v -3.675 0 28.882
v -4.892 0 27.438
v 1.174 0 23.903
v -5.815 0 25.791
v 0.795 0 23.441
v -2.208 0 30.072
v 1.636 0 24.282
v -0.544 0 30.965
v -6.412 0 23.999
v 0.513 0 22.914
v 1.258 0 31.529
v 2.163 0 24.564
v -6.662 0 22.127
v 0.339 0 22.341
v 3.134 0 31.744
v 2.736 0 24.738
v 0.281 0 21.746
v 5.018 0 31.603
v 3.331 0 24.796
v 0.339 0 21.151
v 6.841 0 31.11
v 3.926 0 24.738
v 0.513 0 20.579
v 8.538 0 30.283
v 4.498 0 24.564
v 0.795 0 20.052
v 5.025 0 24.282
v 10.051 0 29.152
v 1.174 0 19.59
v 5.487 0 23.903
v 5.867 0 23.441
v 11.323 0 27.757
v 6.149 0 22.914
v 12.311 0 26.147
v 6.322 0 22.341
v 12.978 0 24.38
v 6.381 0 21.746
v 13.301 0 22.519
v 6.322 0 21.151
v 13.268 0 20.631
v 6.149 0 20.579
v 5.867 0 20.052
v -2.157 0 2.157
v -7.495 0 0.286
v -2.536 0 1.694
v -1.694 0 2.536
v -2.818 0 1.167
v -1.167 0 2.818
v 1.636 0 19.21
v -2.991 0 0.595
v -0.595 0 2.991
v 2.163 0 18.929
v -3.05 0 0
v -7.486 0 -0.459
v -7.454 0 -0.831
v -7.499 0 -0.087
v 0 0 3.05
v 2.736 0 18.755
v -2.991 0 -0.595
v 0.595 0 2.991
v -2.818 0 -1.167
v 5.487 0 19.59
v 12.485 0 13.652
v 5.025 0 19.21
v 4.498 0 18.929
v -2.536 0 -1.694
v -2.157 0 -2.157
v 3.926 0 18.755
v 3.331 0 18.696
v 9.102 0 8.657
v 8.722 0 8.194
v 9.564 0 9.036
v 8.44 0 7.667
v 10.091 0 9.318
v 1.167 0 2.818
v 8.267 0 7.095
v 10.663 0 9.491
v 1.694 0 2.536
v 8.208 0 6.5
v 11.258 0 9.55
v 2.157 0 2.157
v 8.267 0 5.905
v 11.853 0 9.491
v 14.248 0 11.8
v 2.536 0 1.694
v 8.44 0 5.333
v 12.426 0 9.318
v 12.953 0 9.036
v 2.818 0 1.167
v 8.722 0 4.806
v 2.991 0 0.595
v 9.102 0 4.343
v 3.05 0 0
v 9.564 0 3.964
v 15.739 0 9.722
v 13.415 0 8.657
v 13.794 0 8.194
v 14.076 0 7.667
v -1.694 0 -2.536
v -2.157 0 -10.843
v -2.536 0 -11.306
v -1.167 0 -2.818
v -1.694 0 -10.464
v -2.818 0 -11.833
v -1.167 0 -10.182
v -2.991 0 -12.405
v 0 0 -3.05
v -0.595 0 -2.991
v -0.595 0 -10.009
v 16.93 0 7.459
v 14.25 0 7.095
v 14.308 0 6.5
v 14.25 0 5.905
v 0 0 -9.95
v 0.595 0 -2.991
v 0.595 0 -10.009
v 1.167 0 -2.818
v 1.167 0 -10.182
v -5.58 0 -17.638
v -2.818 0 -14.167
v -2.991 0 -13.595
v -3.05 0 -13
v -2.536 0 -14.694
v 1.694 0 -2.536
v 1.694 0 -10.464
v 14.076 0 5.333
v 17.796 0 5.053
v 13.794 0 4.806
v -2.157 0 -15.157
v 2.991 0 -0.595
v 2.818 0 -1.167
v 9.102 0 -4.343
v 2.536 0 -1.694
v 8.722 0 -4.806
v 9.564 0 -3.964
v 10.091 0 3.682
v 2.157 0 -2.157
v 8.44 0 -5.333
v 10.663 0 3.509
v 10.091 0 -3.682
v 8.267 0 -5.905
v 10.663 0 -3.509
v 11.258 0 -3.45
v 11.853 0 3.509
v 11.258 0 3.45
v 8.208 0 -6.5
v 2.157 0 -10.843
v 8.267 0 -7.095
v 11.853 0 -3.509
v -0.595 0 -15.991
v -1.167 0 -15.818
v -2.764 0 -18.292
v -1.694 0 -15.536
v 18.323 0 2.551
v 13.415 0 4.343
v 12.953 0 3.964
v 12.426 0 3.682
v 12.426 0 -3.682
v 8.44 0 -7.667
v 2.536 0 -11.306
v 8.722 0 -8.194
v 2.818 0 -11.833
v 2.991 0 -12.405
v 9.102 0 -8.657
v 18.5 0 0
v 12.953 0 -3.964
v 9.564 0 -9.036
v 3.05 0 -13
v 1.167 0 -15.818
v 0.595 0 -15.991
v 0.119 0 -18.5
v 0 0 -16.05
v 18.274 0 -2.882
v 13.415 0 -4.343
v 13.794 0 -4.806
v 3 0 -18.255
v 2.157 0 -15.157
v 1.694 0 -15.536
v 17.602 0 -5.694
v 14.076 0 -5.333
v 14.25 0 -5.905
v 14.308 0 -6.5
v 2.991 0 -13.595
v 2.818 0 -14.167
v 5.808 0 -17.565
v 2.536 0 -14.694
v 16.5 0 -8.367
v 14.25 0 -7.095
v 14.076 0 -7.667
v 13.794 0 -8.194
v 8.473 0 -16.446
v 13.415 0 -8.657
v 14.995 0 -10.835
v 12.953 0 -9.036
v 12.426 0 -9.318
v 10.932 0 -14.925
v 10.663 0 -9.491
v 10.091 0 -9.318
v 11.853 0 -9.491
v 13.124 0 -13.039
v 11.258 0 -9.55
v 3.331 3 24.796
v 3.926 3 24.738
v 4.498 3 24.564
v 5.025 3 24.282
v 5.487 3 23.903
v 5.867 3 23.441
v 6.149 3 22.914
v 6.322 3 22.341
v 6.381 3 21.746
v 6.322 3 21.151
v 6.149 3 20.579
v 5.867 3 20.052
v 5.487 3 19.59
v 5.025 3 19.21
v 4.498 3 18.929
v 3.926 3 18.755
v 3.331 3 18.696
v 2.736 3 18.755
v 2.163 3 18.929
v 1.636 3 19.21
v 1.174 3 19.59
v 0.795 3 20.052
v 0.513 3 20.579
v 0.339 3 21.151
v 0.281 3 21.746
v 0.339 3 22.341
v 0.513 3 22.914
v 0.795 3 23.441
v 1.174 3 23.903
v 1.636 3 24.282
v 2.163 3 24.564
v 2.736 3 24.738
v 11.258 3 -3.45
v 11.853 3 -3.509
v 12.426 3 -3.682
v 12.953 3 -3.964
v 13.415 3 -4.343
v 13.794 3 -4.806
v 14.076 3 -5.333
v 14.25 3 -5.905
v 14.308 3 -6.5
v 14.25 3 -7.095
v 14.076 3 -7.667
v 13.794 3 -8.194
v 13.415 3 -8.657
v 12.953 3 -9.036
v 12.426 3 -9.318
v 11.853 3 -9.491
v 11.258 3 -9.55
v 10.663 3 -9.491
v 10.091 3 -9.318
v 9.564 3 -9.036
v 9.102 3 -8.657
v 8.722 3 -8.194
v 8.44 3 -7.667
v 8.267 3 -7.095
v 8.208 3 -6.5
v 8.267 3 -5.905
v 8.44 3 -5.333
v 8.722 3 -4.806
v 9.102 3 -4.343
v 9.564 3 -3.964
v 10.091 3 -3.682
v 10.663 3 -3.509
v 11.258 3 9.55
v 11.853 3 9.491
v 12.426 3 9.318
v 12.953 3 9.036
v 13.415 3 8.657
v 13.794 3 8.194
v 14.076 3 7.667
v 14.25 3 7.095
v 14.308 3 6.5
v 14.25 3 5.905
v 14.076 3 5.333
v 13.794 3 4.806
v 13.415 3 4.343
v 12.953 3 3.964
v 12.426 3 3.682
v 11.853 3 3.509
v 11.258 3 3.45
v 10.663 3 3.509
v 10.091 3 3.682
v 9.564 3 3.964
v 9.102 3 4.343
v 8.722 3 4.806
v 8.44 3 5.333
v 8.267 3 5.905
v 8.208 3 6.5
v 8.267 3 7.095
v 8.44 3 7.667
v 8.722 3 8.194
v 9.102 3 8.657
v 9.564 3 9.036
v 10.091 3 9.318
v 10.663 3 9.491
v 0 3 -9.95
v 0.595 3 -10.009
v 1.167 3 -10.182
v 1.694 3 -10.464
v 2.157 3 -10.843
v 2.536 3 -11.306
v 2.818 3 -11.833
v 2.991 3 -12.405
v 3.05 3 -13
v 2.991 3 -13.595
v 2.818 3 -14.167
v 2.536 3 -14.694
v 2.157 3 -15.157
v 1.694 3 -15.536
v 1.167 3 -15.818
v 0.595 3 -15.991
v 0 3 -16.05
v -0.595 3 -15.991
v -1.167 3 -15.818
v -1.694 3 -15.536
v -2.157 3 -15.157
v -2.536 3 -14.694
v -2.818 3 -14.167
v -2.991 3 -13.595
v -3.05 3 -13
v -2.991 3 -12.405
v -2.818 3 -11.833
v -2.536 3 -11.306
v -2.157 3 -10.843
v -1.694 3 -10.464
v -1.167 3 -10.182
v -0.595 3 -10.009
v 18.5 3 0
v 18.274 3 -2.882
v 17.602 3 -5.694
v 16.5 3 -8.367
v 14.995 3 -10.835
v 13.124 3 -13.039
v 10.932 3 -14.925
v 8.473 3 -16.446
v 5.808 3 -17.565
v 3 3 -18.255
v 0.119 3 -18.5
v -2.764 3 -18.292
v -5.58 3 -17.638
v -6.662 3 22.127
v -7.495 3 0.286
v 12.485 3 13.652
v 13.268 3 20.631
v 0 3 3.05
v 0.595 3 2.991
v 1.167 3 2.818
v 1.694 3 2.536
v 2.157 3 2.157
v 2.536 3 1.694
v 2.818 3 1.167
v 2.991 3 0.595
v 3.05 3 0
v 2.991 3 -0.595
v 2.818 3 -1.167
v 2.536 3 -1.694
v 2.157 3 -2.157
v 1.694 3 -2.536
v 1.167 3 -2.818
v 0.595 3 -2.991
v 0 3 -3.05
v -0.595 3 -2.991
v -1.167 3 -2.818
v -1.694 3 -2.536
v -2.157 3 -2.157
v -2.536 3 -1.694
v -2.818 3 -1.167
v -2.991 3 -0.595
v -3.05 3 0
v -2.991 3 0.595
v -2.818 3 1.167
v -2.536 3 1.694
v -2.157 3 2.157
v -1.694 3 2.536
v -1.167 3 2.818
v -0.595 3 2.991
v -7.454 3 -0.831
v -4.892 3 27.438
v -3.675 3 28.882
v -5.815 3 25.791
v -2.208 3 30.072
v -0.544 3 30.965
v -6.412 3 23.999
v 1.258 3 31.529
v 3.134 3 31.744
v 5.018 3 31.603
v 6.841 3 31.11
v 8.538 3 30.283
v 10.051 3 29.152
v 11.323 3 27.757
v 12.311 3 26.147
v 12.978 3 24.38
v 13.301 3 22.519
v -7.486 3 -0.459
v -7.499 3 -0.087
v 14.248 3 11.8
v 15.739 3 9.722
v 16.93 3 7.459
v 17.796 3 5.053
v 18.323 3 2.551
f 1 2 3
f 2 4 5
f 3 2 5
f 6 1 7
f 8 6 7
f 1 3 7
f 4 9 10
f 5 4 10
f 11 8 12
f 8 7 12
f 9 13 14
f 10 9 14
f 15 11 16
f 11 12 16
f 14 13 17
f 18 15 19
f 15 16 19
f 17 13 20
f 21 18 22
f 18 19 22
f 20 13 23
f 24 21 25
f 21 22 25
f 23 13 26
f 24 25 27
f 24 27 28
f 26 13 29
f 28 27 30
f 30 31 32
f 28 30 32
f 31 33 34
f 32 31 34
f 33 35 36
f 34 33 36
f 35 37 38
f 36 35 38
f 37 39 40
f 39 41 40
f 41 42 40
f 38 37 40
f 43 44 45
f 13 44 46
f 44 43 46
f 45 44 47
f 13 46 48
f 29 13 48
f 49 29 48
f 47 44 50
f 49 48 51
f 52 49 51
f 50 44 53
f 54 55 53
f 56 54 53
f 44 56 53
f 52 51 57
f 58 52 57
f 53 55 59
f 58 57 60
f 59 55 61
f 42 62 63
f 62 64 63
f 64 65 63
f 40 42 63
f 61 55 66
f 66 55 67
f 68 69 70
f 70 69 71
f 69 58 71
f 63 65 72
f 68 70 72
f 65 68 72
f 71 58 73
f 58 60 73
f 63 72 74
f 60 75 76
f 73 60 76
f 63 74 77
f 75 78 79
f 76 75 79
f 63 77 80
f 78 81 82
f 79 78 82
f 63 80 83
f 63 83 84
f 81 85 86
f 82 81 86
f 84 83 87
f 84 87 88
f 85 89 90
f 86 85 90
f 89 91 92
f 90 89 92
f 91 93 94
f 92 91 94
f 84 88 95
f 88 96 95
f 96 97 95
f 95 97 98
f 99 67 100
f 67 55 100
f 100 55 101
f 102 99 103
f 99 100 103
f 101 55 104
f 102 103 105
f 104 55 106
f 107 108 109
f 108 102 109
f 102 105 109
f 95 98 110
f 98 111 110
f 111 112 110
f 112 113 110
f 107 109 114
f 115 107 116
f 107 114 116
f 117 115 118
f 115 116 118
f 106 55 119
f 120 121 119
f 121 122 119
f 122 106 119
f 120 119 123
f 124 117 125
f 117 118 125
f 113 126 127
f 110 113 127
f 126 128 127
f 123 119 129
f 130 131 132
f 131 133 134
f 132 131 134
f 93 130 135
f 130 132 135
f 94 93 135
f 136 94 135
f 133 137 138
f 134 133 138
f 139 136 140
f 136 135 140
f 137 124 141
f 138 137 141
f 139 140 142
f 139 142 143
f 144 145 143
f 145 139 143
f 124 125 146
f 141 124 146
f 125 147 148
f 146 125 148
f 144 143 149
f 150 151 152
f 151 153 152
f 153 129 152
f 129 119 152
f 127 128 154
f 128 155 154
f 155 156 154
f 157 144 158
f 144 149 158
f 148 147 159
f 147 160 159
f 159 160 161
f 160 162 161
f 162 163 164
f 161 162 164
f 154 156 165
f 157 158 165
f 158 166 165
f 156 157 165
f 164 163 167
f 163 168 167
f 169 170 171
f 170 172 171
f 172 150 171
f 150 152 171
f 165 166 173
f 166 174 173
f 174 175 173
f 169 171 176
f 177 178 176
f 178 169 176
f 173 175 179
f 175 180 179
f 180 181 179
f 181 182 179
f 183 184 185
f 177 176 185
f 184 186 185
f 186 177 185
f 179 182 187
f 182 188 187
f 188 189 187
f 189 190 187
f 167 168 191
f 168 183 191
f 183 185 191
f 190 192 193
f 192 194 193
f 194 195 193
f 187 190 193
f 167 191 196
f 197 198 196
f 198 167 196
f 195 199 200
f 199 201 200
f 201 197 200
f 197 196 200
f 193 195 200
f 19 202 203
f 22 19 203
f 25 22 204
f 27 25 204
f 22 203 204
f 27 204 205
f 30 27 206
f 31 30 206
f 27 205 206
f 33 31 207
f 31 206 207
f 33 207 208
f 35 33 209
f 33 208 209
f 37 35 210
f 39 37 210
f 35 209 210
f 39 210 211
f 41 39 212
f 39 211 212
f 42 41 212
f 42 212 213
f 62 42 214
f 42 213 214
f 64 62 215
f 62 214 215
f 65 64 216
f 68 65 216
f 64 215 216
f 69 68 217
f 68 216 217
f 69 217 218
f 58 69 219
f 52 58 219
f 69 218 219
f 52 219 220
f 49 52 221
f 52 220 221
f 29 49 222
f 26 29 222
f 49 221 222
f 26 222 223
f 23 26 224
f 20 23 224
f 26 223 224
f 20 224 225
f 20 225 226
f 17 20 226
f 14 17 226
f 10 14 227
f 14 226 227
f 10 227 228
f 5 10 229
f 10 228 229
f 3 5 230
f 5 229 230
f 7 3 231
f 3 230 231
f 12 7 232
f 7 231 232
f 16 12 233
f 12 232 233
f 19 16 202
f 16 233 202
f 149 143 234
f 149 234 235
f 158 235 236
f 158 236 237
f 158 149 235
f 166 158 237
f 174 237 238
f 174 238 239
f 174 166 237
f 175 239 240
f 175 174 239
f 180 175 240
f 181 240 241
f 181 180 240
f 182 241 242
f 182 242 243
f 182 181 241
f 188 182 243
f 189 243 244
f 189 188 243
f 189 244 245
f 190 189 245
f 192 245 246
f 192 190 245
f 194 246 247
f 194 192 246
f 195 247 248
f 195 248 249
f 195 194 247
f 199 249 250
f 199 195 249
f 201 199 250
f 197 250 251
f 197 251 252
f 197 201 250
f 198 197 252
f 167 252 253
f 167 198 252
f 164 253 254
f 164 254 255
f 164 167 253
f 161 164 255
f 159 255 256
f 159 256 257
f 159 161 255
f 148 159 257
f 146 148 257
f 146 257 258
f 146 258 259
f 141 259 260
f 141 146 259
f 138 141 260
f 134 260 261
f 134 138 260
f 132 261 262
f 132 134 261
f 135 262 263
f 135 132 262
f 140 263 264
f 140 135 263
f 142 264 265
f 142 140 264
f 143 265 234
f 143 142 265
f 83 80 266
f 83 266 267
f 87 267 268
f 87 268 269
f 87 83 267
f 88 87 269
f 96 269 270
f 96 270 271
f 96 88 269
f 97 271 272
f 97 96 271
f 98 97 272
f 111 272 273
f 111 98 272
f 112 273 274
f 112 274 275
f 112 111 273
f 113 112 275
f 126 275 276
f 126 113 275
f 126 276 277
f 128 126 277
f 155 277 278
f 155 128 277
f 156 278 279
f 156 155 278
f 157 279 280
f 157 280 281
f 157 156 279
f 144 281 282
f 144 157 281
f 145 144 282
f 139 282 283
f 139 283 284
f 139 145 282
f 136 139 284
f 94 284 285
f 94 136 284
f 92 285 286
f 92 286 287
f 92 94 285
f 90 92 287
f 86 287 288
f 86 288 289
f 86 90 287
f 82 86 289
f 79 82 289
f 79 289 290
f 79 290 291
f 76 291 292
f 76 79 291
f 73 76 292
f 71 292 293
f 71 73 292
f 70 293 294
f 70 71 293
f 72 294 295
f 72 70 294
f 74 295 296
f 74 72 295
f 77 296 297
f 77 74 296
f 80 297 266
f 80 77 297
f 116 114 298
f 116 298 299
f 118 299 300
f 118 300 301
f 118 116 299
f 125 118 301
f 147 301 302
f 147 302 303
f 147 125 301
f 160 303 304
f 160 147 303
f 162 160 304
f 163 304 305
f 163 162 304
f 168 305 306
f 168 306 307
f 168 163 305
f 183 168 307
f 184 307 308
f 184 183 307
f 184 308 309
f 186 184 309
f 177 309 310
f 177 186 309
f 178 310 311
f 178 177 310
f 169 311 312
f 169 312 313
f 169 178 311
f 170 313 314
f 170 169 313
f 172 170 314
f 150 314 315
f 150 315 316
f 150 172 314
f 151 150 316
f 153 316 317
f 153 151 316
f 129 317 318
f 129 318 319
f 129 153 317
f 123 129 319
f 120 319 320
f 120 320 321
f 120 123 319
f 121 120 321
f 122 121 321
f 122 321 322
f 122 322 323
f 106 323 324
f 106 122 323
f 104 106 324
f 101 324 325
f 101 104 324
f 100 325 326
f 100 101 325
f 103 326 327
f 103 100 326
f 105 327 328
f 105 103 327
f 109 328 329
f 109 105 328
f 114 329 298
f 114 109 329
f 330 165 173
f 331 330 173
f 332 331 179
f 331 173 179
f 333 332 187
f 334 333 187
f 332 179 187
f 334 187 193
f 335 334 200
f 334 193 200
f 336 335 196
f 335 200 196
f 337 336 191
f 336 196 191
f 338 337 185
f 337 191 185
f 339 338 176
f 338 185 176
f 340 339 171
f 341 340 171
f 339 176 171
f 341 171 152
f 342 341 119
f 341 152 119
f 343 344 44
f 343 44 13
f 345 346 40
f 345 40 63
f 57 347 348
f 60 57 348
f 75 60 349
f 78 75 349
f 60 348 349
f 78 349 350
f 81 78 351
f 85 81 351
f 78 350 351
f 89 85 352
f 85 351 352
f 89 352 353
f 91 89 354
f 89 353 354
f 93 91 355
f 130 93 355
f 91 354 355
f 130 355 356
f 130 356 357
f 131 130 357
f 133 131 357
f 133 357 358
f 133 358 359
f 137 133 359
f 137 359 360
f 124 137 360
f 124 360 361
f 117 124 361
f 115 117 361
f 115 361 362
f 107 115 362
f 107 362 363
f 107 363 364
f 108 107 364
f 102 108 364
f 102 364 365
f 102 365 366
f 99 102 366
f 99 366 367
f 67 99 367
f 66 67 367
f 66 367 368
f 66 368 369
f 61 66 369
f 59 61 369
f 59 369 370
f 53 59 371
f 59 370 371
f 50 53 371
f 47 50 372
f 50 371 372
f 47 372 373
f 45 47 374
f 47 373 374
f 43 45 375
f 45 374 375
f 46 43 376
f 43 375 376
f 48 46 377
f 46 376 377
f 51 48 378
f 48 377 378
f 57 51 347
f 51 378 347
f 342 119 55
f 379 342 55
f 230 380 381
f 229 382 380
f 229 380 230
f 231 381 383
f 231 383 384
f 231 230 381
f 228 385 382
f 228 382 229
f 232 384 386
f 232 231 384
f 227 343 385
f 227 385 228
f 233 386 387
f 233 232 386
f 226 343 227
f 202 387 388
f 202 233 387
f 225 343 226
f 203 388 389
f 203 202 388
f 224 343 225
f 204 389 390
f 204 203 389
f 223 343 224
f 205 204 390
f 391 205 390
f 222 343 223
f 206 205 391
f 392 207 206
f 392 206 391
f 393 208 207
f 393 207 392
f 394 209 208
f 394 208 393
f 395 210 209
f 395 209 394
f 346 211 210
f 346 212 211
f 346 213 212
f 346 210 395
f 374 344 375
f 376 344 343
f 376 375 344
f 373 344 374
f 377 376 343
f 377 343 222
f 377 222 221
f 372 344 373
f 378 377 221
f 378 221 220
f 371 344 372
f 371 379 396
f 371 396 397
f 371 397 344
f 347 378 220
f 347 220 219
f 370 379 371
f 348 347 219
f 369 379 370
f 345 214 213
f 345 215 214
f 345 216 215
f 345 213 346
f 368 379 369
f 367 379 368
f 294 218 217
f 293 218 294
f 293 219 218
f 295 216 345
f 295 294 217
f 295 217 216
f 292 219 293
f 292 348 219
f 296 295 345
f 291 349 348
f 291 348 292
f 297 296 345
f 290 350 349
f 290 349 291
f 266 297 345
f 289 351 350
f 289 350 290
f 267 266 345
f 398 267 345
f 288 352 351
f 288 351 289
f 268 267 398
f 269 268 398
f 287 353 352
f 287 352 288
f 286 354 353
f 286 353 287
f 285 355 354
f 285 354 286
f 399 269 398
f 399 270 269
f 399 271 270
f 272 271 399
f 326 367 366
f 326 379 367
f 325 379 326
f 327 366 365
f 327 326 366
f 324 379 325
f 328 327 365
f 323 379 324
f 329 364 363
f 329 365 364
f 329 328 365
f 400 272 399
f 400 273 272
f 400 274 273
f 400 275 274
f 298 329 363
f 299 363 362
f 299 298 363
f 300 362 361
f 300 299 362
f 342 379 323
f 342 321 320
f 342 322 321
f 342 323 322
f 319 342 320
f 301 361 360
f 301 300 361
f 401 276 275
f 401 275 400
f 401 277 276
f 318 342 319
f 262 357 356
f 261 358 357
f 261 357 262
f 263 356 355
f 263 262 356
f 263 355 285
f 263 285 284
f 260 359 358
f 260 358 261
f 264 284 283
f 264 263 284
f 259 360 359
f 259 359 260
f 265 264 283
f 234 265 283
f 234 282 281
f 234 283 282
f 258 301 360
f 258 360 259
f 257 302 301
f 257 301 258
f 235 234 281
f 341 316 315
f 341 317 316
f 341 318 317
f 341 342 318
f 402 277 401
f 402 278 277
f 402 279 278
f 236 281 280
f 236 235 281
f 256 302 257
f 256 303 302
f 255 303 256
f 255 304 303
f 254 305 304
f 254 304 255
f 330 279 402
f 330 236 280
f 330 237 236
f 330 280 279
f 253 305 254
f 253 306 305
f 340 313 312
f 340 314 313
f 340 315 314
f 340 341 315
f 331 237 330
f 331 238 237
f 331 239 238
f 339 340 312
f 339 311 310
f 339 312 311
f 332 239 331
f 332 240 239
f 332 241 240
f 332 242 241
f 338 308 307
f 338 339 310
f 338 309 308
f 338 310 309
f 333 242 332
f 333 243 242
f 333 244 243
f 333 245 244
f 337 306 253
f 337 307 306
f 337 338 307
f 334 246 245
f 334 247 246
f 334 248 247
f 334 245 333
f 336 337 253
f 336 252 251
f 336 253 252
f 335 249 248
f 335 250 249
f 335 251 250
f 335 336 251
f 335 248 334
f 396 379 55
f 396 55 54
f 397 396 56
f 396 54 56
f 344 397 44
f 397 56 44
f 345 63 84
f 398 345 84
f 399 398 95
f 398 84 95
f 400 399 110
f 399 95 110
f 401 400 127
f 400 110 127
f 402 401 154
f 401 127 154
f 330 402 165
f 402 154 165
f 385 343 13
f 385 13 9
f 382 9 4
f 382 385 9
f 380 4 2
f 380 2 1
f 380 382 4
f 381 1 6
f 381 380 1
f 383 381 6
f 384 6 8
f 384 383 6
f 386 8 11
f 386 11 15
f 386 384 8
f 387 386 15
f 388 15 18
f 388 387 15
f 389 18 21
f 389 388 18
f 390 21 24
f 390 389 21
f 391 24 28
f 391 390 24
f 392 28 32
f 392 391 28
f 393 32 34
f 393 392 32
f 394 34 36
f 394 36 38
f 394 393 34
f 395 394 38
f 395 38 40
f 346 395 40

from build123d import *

# Parameters (mm, degrees)
SKETCH_1_R          = 7.5
SKETCH_1_R_2        = 3.05
EXTRUDE_1_DEPTH     = 3
SKETCH_2_R          = 3.05
EXTRUDE_2_DEPTH     = 3
SKETCH_3_R          = 3.05
CUT_EXTRUDE_1_DEPTH = 37.865769394


with BuildPart() as part:
    # 草图1 → 凸台-拉伸1 (new body)
    # profile 1 of 2: a face of its own
    with BuildSketch(Plane(origin=(0, 0, 0), x_dir=(1, 0, 0), z_dir=(0, 1, 0))):
        Circle(SKETCH_1_R)
    # profile 2 of 2: a face of its own
    with BuildSketch(Plane(origin=(0, 0, 0), x_dir=(1, 0, 0), z_dir=(0, 1, 0))):
        with BuildLine():
            ThreePointArc((18.5, 0), (10.931866676, 14.924620296), (-5.58046389, 17.638265866))
            Line((-5.58046389, 17.638265866), (-7.453841227, 0.830813432))
            ThreePointArc((-7.453841227, 0.830813432), (0.41604735, 7.488451416), (7.5, 0))
            ThreePointArc((7.5, 0), (4.104533282, -6.277165486), (-3.007415076, -6.870622574))
            Line((-3.007415076, -6.870622574), (12.484954374, -13.651956427))
            ThreePointArc((12.484954374, -13.651956427), (16.9295844, -7.45916698), (18.5, 0))
        make_face()
        with Locations(Location((11.258330249, -6.5, 0), (0, 0, 270))):
            Circle(SKETCH_1_R_2, mode=Mode.SUBTRACT)
        with Locations(Location((11.258330249, 6.5, 0), (0, 0, 270))):
            Circle(SKETCH_1_R_2, mode=Mode.SUBTRACT)
        with Locations(Location((0, 13, 0), (0, 0, 270))):
            Circle(SKETCH_1_R_2, mode=Mode.SUBTRACT)
    extrude(amount=EXTRUDE_1_DEPTH)

    # 草图2 → 凸台-拉伸2 (add, through all)
    with BuildSketch(Plane(origin=(0, 3, 0), x_dir=(1, 0, 0), z_dir=(0, 1, 0))):
        with BuildLine():
            ThreePointArc((-3.007415076, -6.870622574), (-6.197847944, -4.223349483), (-7.49455821, -0.285652289))
            Line((-7.49455821, -0.285652289), (-6.662072489, -22.1272861))
            ThreePointArc((-6.662072489, -22.1272861), (4.07930362, -31.718354527), (13.268273691, -20.6310382))
            Line((13.268273691, -20.6310382), (12.484954374, -13.651956427))
            Line((12.484954374, -13.651956427), (-3.007415076, -6.870622574))
        make_face()
        with Locations(Location((3.330671791, -21.746416381, 0), (0, 0, 270))):
            Circle(SKETCH_2_R, mode=Mode.SUBTRACT)
    extrude(amount=-EXTRUDE_2_DEPTH)

    # 草图3 → 切除-拉伸1 (cut, through all)
    with BuildSketch(Plane(origin=(0, 3, 0), x_dir=(1, 0, 0), z_dir=(0, 1, 0))):
        with Locations(Location((0, 0, 0), (0, 0, 270))):
            Circle(SKETCH_3_R)
    extrude(amount=-CUT_EXTRUDE_1_DEPTH, mode=Mode.SUBTRACT)


solid = part.part
